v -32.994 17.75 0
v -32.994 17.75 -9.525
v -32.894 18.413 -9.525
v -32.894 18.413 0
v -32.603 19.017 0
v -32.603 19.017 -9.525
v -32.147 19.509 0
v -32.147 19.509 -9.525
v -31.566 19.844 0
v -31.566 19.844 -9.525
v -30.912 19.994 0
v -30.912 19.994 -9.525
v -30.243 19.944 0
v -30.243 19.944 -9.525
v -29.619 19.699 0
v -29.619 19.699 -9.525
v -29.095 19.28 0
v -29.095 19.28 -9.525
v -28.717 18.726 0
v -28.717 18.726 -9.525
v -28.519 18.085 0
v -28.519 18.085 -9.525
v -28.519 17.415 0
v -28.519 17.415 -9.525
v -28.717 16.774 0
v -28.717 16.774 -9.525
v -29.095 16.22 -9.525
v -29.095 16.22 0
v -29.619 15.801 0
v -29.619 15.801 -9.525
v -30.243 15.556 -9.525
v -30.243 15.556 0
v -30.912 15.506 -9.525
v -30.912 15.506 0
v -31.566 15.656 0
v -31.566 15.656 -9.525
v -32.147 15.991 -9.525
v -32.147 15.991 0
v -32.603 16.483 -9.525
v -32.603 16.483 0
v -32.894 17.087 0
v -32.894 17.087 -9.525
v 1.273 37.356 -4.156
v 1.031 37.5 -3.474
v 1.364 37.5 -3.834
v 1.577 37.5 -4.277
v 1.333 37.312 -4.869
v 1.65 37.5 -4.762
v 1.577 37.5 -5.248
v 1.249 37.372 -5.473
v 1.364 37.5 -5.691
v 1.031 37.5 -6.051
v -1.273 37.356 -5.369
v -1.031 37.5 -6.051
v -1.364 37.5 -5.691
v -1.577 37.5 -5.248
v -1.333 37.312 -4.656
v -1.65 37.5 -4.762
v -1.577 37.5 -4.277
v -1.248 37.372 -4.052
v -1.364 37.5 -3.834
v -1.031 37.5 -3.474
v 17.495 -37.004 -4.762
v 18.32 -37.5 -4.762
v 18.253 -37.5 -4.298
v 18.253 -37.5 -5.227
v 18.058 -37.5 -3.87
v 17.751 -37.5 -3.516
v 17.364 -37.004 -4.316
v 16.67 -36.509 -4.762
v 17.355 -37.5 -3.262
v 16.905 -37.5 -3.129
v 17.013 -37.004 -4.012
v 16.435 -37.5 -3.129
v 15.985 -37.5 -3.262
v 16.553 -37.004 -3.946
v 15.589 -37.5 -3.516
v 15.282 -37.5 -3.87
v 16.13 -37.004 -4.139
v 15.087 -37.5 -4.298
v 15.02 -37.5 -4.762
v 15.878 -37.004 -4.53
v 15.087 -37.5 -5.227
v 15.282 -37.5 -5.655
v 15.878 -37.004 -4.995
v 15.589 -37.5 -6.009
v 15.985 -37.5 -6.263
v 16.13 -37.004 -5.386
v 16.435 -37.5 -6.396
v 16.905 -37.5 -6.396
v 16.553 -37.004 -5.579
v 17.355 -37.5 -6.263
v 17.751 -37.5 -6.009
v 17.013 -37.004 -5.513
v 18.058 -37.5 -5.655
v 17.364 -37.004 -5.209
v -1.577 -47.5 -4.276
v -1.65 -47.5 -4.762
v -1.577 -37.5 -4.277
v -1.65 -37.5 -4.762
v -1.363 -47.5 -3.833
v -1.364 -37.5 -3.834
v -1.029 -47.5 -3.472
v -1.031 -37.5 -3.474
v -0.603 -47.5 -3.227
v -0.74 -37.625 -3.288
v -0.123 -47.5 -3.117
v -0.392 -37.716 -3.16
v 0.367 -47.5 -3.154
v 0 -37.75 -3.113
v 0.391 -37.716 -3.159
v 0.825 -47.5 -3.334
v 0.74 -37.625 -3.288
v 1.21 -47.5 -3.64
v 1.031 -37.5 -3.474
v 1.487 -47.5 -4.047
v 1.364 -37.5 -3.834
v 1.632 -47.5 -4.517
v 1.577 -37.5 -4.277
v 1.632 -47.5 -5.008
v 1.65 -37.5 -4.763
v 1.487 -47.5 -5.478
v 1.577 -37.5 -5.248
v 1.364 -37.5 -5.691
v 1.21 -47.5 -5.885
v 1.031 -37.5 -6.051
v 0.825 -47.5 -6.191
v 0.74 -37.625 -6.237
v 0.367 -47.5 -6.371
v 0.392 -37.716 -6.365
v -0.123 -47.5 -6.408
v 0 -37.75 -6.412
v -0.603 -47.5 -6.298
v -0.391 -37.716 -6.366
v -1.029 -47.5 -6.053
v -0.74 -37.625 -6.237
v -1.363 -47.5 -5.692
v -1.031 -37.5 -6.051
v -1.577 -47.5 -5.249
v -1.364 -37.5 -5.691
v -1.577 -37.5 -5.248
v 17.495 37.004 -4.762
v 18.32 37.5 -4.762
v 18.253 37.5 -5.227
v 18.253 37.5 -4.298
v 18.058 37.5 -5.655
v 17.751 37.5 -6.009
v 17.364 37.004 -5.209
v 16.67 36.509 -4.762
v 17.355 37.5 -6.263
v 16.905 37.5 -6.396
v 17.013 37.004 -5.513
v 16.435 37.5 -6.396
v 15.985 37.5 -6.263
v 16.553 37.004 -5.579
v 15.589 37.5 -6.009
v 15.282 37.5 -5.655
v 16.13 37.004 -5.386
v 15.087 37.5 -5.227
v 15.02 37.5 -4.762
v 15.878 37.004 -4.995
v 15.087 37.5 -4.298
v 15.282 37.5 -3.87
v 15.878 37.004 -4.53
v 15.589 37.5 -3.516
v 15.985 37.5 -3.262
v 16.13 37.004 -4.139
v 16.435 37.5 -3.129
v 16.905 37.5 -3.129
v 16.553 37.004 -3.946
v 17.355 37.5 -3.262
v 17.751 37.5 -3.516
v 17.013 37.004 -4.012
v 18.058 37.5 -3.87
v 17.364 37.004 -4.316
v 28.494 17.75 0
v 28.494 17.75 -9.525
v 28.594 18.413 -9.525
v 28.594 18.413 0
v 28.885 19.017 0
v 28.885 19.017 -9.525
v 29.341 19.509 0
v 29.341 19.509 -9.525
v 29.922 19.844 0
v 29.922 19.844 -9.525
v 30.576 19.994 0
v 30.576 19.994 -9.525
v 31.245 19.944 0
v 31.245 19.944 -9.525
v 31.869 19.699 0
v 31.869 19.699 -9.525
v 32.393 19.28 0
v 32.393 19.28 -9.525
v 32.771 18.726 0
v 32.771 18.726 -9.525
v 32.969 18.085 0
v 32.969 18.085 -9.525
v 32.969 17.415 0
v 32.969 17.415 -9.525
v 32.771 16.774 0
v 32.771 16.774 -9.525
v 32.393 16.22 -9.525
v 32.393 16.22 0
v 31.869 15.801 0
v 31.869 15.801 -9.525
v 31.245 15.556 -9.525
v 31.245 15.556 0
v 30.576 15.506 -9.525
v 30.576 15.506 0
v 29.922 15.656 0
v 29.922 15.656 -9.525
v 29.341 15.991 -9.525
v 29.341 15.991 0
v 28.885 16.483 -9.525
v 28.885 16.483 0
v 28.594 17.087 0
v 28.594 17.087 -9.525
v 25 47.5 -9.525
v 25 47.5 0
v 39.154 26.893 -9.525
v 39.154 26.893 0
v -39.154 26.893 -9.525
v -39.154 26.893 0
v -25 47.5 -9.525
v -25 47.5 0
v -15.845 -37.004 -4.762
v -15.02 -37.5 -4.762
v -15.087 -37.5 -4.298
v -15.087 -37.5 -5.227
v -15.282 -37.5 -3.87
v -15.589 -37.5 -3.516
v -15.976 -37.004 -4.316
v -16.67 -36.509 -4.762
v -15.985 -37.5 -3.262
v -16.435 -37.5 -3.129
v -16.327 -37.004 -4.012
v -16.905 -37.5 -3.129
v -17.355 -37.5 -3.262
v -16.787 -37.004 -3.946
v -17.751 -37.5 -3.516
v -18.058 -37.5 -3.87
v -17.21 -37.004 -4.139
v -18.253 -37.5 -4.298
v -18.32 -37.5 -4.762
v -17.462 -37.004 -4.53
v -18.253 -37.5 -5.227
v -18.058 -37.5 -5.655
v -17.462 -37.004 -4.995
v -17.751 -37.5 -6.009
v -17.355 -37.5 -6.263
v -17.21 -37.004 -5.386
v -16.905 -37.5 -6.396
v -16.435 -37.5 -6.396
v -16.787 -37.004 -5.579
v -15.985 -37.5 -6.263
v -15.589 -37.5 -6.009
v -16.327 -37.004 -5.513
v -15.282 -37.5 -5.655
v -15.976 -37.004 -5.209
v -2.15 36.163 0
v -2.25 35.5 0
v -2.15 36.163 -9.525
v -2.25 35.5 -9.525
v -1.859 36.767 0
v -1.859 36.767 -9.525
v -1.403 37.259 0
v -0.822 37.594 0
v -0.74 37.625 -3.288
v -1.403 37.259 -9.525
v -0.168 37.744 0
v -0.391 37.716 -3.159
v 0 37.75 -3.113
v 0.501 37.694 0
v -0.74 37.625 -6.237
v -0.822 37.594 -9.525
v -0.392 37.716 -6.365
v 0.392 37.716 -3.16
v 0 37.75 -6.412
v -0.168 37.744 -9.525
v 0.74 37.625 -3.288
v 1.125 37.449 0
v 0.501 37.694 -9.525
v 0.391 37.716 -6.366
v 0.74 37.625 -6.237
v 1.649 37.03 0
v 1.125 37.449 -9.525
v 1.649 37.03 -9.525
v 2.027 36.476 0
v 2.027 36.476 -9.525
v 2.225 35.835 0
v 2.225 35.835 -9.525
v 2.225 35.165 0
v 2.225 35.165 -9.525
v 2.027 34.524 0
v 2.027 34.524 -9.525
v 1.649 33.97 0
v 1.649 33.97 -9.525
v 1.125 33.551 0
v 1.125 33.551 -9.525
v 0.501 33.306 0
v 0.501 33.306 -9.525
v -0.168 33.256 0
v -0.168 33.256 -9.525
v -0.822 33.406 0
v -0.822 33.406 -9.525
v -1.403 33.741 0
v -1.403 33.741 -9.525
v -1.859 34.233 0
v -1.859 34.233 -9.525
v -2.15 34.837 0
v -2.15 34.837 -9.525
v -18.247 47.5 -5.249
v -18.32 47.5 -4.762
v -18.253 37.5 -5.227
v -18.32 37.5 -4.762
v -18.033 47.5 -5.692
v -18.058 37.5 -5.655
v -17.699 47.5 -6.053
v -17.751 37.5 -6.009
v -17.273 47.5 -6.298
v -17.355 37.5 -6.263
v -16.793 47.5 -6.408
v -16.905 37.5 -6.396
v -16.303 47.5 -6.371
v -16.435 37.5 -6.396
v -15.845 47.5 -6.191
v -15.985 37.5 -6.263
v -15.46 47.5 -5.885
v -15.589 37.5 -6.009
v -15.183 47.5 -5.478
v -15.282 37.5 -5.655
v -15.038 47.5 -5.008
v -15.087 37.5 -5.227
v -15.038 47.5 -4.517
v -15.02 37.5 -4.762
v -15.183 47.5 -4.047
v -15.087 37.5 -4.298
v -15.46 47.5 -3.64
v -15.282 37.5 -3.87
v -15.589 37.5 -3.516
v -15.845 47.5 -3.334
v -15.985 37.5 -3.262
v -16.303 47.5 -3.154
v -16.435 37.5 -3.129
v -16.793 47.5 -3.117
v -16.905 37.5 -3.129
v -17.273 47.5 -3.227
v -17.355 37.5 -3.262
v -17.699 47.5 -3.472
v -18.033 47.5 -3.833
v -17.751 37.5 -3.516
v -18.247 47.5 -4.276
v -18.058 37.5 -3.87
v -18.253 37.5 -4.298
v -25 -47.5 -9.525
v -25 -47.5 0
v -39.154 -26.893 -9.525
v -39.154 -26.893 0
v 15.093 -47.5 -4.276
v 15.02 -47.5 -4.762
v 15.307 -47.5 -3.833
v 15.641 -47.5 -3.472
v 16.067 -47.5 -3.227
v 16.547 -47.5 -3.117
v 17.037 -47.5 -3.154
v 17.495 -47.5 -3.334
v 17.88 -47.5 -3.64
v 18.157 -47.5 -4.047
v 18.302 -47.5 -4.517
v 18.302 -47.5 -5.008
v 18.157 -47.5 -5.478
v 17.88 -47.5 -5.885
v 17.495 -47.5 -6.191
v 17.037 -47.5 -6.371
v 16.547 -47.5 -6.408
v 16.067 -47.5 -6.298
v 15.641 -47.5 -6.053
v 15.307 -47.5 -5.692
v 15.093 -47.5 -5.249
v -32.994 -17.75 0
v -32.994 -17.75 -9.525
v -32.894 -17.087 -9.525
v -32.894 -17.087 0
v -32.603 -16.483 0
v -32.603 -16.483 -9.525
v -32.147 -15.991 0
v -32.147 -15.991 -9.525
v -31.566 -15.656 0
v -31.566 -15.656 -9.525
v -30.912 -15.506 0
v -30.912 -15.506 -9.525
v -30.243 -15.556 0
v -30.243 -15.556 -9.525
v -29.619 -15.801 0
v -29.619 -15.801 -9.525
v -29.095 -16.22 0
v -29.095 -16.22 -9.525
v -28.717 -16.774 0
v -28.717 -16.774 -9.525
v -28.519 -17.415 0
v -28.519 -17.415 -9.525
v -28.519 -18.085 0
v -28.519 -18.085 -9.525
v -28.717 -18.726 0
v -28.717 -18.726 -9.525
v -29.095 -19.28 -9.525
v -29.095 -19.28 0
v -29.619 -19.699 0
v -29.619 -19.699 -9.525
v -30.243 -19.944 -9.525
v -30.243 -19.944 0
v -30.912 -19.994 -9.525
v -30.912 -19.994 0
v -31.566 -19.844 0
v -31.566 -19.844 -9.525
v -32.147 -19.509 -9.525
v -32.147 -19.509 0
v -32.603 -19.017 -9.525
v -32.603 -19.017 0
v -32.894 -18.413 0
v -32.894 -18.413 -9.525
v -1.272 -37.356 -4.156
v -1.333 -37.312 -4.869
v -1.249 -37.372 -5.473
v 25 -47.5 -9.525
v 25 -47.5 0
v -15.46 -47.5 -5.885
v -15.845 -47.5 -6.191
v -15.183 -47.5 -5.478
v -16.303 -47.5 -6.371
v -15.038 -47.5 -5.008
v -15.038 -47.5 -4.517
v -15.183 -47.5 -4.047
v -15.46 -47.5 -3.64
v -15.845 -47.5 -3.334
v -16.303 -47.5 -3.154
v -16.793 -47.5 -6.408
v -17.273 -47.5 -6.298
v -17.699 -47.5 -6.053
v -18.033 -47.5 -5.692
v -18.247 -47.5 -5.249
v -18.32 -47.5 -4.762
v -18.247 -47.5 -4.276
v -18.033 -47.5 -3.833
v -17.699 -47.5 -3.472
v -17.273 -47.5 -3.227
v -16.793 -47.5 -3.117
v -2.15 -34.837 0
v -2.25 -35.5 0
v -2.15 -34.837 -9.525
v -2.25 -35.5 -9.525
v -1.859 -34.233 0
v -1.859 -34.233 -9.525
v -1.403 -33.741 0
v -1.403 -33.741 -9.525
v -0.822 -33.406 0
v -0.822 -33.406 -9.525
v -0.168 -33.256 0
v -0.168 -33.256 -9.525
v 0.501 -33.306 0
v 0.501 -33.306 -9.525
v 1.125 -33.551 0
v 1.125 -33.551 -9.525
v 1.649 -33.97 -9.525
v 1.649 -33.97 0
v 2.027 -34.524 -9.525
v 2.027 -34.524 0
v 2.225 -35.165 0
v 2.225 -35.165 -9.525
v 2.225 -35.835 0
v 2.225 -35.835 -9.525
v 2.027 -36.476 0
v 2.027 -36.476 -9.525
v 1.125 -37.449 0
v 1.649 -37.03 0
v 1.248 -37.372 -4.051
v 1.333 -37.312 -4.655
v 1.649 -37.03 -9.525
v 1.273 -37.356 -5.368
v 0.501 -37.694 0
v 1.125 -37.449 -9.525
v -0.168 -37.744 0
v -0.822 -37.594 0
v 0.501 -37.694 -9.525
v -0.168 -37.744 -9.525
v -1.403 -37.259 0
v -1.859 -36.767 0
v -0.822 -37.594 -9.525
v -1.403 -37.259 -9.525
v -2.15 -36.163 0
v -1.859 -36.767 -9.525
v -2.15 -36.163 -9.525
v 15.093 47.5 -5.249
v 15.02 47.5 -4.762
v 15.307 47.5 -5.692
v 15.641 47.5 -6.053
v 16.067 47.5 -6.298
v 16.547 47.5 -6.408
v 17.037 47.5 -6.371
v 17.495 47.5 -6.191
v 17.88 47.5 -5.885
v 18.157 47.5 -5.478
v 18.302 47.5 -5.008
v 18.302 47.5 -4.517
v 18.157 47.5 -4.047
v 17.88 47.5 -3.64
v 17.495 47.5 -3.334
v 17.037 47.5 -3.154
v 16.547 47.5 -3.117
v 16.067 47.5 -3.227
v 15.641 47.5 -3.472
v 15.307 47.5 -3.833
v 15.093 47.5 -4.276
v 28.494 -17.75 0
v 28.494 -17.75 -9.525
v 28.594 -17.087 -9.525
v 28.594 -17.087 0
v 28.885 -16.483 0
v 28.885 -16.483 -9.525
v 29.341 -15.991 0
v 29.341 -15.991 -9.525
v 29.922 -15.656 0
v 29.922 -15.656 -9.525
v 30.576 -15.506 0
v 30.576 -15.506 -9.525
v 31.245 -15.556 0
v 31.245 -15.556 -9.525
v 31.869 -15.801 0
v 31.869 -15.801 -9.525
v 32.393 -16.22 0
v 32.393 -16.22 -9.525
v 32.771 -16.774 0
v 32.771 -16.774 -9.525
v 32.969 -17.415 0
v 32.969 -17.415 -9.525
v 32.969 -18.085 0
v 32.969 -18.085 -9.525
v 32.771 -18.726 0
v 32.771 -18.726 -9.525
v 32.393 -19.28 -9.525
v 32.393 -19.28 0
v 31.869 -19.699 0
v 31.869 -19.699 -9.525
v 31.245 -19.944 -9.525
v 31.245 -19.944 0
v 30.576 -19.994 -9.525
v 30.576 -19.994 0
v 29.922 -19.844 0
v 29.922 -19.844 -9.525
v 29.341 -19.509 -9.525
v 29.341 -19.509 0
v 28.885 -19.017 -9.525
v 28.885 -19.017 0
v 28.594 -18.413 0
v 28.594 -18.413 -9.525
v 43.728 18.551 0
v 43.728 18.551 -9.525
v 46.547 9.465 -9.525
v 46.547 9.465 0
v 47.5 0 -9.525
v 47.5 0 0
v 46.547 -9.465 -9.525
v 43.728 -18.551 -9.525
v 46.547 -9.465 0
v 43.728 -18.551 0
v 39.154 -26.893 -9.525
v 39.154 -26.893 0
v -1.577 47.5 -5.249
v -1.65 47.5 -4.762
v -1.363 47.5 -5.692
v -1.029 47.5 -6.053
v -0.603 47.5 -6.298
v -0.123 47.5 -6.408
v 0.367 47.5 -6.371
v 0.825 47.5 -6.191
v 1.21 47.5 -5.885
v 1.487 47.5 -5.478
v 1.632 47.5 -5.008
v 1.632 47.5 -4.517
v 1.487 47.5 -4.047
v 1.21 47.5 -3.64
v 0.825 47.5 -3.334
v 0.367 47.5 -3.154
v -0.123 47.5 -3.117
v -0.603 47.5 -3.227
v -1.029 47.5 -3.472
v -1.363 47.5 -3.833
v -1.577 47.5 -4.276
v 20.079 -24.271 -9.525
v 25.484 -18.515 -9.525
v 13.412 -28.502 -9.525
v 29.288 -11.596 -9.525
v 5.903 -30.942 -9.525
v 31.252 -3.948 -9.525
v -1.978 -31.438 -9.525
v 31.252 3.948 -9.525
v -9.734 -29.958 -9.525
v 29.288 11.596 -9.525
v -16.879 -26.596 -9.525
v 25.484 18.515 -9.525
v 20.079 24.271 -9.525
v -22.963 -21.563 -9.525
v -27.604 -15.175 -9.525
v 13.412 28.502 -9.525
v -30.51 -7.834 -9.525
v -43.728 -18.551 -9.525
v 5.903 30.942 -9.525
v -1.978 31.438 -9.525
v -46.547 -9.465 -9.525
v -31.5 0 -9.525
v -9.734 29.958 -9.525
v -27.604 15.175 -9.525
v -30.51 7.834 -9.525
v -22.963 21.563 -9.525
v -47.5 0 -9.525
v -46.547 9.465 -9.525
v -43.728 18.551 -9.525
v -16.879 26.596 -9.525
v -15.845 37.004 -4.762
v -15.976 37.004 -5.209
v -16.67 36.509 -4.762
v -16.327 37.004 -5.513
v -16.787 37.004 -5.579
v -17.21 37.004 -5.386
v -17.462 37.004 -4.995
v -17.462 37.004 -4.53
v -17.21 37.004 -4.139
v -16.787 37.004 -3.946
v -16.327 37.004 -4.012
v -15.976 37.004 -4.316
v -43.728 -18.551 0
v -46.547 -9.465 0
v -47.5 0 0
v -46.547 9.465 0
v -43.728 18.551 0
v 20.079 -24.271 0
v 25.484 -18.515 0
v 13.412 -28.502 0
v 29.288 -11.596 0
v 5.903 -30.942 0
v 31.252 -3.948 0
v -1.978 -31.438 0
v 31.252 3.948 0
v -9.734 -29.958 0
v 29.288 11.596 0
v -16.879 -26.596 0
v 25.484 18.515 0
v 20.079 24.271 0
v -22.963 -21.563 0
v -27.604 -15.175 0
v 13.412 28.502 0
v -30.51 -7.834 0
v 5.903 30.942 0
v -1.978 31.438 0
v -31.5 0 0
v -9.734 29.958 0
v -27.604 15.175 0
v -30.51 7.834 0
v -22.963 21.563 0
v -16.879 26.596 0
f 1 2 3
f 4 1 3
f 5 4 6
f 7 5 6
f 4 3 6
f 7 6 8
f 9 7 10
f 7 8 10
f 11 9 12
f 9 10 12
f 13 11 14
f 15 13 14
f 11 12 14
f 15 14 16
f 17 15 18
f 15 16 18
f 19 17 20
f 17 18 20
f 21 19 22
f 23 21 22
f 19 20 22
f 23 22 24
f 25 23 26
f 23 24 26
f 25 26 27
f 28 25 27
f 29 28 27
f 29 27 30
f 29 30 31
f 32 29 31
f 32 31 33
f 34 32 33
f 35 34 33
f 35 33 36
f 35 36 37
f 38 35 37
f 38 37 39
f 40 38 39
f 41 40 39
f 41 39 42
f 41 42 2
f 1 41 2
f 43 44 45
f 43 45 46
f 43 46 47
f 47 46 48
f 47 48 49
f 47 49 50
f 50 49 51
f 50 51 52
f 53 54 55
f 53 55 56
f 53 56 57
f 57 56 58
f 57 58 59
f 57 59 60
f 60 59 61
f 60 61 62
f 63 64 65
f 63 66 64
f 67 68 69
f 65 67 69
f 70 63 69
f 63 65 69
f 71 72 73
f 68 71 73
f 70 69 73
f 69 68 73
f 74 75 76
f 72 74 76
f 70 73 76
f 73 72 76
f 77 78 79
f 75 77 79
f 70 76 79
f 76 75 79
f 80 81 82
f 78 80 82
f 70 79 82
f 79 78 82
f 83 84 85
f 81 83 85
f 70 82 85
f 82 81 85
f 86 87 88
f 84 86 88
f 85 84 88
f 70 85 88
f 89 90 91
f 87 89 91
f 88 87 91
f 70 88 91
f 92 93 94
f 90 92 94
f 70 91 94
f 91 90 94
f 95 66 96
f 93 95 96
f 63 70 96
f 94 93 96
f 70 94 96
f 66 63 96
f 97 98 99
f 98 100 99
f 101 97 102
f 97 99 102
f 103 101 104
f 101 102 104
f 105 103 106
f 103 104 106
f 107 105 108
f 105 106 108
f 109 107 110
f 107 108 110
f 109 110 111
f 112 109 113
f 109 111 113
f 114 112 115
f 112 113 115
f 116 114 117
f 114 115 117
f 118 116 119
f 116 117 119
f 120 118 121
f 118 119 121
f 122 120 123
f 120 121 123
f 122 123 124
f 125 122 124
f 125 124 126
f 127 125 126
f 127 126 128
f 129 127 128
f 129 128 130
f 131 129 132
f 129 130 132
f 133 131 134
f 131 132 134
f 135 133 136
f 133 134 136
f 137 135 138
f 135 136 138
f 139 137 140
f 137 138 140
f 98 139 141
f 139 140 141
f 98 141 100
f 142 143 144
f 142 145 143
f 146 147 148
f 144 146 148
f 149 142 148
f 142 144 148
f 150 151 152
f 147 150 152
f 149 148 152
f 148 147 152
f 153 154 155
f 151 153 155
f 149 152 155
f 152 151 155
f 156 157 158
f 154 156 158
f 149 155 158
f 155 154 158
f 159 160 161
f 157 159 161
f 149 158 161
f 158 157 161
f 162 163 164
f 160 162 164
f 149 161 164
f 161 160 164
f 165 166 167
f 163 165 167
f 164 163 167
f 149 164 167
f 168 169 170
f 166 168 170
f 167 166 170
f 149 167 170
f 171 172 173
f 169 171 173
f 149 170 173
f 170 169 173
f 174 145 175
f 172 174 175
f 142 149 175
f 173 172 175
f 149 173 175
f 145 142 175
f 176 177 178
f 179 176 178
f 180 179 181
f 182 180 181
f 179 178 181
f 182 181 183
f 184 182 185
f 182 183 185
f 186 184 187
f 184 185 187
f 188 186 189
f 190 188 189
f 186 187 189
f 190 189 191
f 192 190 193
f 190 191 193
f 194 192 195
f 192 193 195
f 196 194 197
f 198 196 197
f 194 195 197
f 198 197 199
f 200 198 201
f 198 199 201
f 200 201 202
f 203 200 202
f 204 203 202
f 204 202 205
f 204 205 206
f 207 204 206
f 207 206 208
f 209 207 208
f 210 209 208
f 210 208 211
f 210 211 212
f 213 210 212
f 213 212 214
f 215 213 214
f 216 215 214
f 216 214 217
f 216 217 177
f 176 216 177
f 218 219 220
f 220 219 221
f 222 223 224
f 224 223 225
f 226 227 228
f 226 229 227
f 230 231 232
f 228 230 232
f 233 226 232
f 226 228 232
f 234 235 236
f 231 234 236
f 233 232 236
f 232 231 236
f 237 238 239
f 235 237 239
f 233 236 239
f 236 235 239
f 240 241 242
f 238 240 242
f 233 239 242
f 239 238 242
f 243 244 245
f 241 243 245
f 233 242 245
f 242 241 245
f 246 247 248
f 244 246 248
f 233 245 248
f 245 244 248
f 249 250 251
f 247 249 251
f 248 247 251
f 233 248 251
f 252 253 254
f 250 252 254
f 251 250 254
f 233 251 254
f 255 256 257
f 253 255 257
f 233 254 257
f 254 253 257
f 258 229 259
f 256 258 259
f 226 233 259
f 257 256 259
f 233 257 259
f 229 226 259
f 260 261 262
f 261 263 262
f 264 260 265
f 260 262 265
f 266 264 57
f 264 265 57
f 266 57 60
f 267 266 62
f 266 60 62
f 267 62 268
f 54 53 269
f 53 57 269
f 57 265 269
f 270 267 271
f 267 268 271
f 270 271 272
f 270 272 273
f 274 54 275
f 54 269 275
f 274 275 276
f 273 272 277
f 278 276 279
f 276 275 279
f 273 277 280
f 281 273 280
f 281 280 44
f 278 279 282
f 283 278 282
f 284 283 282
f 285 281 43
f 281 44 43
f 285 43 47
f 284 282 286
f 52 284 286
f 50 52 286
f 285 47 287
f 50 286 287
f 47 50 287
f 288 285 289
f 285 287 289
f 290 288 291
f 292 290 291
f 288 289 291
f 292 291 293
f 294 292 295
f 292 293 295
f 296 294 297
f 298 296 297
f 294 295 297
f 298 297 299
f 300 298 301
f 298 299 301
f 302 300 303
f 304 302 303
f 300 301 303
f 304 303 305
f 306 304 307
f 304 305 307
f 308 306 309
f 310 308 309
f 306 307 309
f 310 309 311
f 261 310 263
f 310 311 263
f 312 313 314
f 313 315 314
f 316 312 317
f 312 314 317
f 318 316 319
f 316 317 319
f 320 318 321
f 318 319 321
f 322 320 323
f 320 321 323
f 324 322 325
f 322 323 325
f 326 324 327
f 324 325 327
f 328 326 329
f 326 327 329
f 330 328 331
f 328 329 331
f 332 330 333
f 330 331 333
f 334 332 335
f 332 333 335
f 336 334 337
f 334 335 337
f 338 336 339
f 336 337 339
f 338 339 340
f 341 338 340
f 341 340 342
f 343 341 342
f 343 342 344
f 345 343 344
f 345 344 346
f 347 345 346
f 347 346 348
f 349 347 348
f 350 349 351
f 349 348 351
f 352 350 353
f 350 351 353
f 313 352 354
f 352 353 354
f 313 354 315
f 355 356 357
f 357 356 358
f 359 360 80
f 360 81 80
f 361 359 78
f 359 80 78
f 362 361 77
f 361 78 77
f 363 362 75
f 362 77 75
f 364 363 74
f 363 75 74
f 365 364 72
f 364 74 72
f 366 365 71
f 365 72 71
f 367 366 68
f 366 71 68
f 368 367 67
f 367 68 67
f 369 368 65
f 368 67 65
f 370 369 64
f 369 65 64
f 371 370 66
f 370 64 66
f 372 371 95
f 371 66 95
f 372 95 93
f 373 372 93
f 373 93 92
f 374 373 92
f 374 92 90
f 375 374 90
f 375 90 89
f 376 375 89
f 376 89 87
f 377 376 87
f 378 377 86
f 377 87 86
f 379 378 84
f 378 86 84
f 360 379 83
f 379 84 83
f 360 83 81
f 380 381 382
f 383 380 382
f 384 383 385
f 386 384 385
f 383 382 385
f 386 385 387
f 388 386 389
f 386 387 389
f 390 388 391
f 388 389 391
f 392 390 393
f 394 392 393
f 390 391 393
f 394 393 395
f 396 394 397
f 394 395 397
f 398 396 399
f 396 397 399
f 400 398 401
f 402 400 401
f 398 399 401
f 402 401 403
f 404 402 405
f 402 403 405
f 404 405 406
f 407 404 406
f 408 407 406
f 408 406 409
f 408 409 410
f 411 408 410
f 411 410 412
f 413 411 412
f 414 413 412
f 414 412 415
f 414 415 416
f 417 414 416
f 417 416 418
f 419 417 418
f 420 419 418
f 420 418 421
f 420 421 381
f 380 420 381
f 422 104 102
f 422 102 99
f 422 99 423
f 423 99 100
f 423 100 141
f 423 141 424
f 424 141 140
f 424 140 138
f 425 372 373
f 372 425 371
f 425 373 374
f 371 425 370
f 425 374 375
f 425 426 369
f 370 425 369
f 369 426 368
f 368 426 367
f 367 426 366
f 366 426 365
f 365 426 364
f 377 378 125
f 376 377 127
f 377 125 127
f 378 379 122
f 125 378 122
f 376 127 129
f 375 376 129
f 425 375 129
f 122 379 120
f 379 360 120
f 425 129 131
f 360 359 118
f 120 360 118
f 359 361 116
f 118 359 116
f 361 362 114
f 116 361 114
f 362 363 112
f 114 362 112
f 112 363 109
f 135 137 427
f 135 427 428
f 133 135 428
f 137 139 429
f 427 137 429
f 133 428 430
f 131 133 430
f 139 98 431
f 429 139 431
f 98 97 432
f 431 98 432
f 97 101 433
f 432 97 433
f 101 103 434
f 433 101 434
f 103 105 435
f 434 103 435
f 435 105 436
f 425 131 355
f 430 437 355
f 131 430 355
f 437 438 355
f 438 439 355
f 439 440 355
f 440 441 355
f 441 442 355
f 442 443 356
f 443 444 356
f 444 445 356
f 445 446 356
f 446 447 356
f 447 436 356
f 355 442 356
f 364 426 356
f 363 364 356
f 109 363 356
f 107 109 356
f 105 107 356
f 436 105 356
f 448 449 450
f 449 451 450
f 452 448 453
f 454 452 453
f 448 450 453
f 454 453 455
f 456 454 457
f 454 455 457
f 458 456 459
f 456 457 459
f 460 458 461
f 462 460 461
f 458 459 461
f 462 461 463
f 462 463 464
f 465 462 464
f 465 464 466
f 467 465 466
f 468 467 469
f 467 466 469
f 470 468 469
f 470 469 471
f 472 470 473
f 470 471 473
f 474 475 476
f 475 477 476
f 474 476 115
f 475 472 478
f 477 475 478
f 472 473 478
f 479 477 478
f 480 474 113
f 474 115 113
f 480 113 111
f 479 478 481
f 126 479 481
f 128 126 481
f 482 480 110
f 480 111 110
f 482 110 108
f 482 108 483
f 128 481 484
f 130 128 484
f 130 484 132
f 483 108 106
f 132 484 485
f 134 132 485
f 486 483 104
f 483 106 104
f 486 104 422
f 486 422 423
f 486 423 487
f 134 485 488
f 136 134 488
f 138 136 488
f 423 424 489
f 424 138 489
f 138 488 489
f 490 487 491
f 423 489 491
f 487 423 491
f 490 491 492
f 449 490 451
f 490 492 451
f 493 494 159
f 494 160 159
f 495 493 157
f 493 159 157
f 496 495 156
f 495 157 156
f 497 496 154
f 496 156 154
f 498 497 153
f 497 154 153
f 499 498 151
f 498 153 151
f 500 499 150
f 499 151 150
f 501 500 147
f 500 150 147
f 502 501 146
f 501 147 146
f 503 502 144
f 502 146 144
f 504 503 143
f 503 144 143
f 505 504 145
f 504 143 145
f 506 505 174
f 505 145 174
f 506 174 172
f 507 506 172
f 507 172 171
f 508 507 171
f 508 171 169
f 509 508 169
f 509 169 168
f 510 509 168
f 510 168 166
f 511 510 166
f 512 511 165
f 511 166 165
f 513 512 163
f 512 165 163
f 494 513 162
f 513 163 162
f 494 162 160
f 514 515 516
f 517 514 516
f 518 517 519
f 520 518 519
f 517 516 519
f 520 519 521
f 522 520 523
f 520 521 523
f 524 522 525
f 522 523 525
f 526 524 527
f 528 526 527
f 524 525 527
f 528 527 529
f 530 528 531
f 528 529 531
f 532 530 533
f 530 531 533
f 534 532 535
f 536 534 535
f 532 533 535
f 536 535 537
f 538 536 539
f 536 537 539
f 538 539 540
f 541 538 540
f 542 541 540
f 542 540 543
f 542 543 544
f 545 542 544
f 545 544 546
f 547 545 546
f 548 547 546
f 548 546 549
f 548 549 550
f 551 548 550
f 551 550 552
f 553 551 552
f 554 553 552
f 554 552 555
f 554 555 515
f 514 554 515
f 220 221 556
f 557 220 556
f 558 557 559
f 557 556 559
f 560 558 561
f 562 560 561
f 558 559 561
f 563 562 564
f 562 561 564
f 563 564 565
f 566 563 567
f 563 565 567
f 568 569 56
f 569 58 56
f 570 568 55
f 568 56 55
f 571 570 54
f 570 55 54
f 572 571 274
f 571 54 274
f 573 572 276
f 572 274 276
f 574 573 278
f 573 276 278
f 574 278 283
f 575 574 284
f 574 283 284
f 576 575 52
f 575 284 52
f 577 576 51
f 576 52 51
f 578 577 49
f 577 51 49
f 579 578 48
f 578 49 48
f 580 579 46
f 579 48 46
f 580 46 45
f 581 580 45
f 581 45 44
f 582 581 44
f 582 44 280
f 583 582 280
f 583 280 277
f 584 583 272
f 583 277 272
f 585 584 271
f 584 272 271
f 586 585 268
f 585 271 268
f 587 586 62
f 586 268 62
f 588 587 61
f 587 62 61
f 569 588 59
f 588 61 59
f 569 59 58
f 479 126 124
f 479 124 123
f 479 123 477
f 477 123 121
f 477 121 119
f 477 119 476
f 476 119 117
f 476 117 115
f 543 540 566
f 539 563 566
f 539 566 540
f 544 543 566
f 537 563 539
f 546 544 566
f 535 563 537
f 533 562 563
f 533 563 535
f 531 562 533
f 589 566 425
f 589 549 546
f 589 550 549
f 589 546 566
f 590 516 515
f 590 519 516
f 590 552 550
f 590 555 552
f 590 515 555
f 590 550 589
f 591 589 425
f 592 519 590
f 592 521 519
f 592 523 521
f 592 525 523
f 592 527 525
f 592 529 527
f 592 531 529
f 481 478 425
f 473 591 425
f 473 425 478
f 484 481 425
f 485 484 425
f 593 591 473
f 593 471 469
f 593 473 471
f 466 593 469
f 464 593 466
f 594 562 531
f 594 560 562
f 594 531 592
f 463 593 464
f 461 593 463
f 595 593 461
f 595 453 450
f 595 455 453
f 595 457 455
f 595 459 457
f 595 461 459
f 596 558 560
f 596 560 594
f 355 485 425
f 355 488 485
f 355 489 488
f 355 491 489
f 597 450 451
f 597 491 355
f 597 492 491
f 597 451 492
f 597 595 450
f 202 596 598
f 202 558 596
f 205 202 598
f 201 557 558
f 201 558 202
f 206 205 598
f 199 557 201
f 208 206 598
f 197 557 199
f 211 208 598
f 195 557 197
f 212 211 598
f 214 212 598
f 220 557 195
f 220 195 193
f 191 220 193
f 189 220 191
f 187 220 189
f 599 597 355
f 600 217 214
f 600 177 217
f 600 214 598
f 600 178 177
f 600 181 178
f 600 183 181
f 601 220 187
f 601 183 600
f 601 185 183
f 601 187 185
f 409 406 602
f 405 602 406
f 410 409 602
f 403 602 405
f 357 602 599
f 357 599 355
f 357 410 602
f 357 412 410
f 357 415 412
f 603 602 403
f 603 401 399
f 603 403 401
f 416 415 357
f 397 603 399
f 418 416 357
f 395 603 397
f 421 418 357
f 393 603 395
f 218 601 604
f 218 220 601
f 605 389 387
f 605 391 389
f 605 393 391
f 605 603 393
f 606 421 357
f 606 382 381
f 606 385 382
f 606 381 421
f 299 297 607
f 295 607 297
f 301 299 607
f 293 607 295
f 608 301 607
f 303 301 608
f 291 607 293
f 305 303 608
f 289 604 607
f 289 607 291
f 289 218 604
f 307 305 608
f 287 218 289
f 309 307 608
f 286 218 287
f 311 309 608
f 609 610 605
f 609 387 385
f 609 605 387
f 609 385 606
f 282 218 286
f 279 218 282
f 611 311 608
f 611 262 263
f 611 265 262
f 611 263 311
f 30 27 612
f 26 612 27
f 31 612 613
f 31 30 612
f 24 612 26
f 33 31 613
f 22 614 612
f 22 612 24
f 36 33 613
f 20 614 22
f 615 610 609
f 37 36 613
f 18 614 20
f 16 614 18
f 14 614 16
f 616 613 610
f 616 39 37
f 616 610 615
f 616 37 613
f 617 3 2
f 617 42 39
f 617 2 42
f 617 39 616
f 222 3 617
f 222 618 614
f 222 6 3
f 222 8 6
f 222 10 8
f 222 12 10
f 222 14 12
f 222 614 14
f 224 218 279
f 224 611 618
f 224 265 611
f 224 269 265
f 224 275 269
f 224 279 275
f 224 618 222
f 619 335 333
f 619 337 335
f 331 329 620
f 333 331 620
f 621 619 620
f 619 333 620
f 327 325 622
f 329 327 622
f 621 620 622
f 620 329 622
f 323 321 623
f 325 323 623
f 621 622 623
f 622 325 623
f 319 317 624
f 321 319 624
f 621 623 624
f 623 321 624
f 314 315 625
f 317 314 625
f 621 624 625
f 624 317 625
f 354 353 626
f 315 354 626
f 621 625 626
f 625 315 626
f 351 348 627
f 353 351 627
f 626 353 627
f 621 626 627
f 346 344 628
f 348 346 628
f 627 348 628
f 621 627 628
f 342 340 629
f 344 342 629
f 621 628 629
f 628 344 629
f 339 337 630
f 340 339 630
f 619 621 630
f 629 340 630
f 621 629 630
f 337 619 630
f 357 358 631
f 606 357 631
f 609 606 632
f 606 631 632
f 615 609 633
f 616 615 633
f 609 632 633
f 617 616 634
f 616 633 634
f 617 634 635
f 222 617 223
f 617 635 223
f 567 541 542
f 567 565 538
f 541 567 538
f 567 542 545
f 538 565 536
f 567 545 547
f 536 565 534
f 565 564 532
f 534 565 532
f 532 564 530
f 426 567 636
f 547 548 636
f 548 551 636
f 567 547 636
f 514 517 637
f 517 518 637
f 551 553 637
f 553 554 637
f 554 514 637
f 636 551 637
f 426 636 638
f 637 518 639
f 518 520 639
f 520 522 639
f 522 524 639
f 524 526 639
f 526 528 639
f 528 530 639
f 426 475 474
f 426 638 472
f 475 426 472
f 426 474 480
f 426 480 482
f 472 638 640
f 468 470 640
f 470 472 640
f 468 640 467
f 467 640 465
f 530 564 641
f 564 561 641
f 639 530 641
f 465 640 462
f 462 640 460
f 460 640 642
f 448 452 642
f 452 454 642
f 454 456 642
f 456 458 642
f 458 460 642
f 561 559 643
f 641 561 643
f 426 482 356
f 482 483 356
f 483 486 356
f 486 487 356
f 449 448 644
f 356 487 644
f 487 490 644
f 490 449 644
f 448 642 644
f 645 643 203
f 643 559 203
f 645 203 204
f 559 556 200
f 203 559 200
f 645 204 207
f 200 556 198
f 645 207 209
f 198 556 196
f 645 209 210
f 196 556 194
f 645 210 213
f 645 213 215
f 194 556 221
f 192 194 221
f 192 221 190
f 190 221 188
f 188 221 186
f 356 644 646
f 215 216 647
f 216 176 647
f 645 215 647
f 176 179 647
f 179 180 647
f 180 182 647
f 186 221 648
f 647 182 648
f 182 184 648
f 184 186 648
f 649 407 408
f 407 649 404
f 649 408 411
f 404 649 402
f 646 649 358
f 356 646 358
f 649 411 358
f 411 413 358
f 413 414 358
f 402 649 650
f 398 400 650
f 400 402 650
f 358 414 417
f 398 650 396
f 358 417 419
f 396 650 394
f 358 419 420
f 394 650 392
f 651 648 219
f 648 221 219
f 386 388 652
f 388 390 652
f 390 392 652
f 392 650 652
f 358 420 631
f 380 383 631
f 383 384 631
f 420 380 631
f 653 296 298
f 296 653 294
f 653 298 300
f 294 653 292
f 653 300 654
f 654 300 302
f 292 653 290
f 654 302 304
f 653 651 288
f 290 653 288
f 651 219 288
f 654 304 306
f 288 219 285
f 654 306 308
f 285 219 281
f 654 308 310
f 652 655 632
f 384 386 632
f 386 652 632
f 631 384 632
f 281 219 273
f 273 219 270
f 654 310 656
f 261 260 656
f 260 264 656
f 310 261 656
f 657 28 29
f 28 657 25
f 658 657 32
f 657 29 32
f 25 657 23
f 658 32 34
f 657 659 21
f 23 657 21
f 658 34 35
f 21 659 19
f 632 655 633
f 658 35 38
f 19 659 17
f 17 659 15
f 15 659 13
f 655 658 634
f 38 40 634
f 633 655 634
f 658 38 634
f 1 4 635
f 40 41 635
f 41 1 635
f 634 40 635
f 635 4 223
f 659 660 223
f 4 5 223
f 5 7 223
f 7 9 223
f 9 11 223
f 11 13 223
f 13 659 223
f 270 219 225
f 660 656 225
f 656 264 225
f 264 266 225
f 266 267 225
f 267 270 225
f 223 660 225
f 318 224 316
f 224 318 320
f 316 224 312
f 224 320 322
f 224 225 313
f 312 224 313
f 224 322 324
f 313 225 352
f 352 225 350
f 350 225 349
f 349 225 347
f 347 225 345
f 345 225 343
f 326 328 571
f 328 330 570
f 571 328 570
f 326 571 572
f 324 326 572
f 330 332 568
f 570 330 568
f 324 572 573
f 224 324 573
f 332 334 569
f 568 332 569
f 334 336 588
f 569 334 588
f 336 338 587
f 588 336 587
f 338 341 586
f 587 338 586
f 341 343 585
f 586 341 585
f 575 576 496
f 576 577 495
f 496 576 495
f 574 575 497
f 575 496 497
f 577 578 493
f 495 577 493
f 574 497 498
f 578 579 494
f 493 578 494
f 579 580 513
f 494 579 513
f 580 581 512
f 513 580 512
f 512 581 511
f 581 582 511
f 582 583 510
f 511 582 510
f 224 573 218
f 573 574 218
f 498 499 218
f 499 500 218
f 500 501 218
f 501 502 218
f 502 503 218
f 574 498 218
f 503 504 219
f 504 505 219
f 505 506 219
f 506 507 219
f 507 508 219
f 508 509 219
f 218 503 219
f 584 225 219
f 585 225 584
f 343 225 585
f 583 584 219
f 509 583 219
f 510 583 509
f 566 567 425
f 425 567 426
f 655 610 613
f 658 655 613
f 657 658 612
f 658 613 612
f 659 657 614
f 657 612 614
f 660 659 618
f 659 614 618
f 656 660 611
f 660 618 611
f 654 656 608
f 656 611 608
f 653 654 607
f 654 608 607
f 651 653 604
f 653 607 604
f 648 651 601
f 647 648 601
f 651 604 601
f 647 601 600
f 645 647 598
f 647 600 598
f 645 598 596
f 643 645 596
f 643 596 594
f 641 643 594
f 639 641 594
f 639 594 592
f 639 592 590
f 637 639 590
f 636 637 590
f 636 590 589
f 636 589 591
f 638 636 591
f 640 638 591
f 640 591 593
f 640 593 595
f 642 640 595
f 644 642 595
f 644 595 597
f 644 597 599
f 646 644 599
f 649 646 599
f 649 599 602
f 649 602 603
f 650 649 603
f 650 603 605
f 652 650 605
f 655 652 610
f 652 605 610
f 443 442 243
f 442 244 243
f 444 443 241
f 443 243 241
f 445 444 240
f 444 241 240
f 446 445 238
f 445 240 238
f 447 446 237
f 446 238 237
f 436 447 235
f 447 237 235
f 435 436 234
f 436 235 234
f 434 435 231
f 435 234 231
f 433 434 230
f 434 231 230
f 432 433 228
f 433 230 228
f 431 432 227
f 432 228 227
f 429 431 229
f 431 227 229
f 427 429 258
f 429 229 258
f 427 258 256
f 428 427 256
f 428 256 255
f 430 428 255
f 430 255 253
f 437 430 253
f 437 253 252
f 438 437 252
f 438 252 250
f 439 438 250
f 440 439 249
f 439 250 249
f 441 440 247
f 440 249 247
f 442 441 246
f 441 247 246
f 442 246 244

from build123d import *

# Parameters (mm, degrees)
BOSS_EXTRUDE1_DEPTH       = 9.525
M4_CLEARANCE_HOLE1_D      = 4.5
SKETCH4_R                 = 31.5
CUT_EXTRUDE1_DEPTH        = 68.847075287
M4X0_7_TAPPED_HOLE1_D     = 3.3
M4X0_7_TAPPED_HOLE1_DEPTH = 10
M4X0_7_TAPPED_HOLE1_TIP   = 0.991420021
M4X0_7_TAPPED_HOLE2_D     = 3.3
M4X0_7_TAPPED_HOLE2_DEPTH = 10
M4X0_7_TAPPED_HOLE2_TIP   = 0.991420021


with BuildPart() as part:
    # Sketch1 → Boss-Extrude1 (new body)
    with BuildSketch(Plane.XY):
        with BuildLine():
            Line((-25, 47.5), (25, 47.5))
            Line((25, 47.5), (39.154013015, 26.892624729))
            ThreePointArc((39.154013015, 26.892624729), (47.5, 0), (39.154013015, -26.892624729))
            Line((39.154013015, -26.892624729), (25, -47.5))
            Line((25, -47.5), (-25, -47.5))
            Line((-25, -47.5), (-39.154013015, -26.892624729))
            ThreePointArc((-39.154013015, -26.892624729), (-47.5, 0), (-39.154013015, 26.892624729))
            Line((-39.154013015, 26.892624729), (-25, 47.5))
        make_face()
    extrude(amount=-BOSS_EXTRUDE1_DEPTH)

    # M4 Clearance Hole1 (through all)
    with Locations(Plane.XY):
        with Locations((-30.743901834, 17.75), (0, 35.5), (59.233049824, 29.038488654), (30.743901834, 17.75), (30.743901834, -17.75), (0, -35.5), (-30.743901834, -17.75)):
            Hole(M4_CLEARANCE_HOLE1_D / 2)

    # Sketch4 → Cut-Extrude1 (cut, through all)
    with BuildSketch(Plane(origin=(0, 0, -9.525), x_dir=(-1, 0, 0), z_dir=(0, 0, -1))):
        Circle(SKETCH4_R)
    extrude(amount=-CUT_EXTRUDE1_DEPTH, mode=Mode.SUBTRACT)

    # M4x0.7 Tapped Hole1
    with Locations(Plane(origin=(0, 47.5, 0), x_dir=(1, 0, 0), z_dir=(0, 1, 0))):
        with Locations((16.67, 4.7625), (0, 4.7625), (-16.67, 4.7625)):
            Hole(M4X0_7_TAPPED_HOLE1_D / 2, depth=M4X0_7_TAPPED_HOLE1_DEPTH)
            with Locations((0, 0, -(M4X0_7_TAPPED_HOLE1_DEPTH + M4X0_7_TAPPED_HOLE1_TIP / 2))):  # 118° drill point
                Cone(0, M4X0_7_TAPPED_HOLE1_D / 2, M4X0_7_TAPPED_HOLE1_TIP, mode=Mode.SUBTRACT)

    # M4x0.7 Tapped Hole2
    with Locations(Plane.XZ.offset(47.5)):
        with Locations((0, -4.7625), (16.67, -4.7625), (-16.67, -4.7625)):
            Hole(M4X0_7_TAPPED_HOLE2_D / 2, depth=M4X0_7_TAPPED_HOLE2_DEPTH)
            with Locations((0, 0, -(M4X0_7_TAPPED_HOLE2_DEPTH + M4X0_7_TAPPED_HOLE2_TIP / 2))):  # 118° drill point
                Cone(0, M4X0_7_TAPPED_HOLE2_D / 2, M4X0_7_TAPPED_HOLE2_TIP, mode=Mode.SUBTRACT)


solid = part.part
